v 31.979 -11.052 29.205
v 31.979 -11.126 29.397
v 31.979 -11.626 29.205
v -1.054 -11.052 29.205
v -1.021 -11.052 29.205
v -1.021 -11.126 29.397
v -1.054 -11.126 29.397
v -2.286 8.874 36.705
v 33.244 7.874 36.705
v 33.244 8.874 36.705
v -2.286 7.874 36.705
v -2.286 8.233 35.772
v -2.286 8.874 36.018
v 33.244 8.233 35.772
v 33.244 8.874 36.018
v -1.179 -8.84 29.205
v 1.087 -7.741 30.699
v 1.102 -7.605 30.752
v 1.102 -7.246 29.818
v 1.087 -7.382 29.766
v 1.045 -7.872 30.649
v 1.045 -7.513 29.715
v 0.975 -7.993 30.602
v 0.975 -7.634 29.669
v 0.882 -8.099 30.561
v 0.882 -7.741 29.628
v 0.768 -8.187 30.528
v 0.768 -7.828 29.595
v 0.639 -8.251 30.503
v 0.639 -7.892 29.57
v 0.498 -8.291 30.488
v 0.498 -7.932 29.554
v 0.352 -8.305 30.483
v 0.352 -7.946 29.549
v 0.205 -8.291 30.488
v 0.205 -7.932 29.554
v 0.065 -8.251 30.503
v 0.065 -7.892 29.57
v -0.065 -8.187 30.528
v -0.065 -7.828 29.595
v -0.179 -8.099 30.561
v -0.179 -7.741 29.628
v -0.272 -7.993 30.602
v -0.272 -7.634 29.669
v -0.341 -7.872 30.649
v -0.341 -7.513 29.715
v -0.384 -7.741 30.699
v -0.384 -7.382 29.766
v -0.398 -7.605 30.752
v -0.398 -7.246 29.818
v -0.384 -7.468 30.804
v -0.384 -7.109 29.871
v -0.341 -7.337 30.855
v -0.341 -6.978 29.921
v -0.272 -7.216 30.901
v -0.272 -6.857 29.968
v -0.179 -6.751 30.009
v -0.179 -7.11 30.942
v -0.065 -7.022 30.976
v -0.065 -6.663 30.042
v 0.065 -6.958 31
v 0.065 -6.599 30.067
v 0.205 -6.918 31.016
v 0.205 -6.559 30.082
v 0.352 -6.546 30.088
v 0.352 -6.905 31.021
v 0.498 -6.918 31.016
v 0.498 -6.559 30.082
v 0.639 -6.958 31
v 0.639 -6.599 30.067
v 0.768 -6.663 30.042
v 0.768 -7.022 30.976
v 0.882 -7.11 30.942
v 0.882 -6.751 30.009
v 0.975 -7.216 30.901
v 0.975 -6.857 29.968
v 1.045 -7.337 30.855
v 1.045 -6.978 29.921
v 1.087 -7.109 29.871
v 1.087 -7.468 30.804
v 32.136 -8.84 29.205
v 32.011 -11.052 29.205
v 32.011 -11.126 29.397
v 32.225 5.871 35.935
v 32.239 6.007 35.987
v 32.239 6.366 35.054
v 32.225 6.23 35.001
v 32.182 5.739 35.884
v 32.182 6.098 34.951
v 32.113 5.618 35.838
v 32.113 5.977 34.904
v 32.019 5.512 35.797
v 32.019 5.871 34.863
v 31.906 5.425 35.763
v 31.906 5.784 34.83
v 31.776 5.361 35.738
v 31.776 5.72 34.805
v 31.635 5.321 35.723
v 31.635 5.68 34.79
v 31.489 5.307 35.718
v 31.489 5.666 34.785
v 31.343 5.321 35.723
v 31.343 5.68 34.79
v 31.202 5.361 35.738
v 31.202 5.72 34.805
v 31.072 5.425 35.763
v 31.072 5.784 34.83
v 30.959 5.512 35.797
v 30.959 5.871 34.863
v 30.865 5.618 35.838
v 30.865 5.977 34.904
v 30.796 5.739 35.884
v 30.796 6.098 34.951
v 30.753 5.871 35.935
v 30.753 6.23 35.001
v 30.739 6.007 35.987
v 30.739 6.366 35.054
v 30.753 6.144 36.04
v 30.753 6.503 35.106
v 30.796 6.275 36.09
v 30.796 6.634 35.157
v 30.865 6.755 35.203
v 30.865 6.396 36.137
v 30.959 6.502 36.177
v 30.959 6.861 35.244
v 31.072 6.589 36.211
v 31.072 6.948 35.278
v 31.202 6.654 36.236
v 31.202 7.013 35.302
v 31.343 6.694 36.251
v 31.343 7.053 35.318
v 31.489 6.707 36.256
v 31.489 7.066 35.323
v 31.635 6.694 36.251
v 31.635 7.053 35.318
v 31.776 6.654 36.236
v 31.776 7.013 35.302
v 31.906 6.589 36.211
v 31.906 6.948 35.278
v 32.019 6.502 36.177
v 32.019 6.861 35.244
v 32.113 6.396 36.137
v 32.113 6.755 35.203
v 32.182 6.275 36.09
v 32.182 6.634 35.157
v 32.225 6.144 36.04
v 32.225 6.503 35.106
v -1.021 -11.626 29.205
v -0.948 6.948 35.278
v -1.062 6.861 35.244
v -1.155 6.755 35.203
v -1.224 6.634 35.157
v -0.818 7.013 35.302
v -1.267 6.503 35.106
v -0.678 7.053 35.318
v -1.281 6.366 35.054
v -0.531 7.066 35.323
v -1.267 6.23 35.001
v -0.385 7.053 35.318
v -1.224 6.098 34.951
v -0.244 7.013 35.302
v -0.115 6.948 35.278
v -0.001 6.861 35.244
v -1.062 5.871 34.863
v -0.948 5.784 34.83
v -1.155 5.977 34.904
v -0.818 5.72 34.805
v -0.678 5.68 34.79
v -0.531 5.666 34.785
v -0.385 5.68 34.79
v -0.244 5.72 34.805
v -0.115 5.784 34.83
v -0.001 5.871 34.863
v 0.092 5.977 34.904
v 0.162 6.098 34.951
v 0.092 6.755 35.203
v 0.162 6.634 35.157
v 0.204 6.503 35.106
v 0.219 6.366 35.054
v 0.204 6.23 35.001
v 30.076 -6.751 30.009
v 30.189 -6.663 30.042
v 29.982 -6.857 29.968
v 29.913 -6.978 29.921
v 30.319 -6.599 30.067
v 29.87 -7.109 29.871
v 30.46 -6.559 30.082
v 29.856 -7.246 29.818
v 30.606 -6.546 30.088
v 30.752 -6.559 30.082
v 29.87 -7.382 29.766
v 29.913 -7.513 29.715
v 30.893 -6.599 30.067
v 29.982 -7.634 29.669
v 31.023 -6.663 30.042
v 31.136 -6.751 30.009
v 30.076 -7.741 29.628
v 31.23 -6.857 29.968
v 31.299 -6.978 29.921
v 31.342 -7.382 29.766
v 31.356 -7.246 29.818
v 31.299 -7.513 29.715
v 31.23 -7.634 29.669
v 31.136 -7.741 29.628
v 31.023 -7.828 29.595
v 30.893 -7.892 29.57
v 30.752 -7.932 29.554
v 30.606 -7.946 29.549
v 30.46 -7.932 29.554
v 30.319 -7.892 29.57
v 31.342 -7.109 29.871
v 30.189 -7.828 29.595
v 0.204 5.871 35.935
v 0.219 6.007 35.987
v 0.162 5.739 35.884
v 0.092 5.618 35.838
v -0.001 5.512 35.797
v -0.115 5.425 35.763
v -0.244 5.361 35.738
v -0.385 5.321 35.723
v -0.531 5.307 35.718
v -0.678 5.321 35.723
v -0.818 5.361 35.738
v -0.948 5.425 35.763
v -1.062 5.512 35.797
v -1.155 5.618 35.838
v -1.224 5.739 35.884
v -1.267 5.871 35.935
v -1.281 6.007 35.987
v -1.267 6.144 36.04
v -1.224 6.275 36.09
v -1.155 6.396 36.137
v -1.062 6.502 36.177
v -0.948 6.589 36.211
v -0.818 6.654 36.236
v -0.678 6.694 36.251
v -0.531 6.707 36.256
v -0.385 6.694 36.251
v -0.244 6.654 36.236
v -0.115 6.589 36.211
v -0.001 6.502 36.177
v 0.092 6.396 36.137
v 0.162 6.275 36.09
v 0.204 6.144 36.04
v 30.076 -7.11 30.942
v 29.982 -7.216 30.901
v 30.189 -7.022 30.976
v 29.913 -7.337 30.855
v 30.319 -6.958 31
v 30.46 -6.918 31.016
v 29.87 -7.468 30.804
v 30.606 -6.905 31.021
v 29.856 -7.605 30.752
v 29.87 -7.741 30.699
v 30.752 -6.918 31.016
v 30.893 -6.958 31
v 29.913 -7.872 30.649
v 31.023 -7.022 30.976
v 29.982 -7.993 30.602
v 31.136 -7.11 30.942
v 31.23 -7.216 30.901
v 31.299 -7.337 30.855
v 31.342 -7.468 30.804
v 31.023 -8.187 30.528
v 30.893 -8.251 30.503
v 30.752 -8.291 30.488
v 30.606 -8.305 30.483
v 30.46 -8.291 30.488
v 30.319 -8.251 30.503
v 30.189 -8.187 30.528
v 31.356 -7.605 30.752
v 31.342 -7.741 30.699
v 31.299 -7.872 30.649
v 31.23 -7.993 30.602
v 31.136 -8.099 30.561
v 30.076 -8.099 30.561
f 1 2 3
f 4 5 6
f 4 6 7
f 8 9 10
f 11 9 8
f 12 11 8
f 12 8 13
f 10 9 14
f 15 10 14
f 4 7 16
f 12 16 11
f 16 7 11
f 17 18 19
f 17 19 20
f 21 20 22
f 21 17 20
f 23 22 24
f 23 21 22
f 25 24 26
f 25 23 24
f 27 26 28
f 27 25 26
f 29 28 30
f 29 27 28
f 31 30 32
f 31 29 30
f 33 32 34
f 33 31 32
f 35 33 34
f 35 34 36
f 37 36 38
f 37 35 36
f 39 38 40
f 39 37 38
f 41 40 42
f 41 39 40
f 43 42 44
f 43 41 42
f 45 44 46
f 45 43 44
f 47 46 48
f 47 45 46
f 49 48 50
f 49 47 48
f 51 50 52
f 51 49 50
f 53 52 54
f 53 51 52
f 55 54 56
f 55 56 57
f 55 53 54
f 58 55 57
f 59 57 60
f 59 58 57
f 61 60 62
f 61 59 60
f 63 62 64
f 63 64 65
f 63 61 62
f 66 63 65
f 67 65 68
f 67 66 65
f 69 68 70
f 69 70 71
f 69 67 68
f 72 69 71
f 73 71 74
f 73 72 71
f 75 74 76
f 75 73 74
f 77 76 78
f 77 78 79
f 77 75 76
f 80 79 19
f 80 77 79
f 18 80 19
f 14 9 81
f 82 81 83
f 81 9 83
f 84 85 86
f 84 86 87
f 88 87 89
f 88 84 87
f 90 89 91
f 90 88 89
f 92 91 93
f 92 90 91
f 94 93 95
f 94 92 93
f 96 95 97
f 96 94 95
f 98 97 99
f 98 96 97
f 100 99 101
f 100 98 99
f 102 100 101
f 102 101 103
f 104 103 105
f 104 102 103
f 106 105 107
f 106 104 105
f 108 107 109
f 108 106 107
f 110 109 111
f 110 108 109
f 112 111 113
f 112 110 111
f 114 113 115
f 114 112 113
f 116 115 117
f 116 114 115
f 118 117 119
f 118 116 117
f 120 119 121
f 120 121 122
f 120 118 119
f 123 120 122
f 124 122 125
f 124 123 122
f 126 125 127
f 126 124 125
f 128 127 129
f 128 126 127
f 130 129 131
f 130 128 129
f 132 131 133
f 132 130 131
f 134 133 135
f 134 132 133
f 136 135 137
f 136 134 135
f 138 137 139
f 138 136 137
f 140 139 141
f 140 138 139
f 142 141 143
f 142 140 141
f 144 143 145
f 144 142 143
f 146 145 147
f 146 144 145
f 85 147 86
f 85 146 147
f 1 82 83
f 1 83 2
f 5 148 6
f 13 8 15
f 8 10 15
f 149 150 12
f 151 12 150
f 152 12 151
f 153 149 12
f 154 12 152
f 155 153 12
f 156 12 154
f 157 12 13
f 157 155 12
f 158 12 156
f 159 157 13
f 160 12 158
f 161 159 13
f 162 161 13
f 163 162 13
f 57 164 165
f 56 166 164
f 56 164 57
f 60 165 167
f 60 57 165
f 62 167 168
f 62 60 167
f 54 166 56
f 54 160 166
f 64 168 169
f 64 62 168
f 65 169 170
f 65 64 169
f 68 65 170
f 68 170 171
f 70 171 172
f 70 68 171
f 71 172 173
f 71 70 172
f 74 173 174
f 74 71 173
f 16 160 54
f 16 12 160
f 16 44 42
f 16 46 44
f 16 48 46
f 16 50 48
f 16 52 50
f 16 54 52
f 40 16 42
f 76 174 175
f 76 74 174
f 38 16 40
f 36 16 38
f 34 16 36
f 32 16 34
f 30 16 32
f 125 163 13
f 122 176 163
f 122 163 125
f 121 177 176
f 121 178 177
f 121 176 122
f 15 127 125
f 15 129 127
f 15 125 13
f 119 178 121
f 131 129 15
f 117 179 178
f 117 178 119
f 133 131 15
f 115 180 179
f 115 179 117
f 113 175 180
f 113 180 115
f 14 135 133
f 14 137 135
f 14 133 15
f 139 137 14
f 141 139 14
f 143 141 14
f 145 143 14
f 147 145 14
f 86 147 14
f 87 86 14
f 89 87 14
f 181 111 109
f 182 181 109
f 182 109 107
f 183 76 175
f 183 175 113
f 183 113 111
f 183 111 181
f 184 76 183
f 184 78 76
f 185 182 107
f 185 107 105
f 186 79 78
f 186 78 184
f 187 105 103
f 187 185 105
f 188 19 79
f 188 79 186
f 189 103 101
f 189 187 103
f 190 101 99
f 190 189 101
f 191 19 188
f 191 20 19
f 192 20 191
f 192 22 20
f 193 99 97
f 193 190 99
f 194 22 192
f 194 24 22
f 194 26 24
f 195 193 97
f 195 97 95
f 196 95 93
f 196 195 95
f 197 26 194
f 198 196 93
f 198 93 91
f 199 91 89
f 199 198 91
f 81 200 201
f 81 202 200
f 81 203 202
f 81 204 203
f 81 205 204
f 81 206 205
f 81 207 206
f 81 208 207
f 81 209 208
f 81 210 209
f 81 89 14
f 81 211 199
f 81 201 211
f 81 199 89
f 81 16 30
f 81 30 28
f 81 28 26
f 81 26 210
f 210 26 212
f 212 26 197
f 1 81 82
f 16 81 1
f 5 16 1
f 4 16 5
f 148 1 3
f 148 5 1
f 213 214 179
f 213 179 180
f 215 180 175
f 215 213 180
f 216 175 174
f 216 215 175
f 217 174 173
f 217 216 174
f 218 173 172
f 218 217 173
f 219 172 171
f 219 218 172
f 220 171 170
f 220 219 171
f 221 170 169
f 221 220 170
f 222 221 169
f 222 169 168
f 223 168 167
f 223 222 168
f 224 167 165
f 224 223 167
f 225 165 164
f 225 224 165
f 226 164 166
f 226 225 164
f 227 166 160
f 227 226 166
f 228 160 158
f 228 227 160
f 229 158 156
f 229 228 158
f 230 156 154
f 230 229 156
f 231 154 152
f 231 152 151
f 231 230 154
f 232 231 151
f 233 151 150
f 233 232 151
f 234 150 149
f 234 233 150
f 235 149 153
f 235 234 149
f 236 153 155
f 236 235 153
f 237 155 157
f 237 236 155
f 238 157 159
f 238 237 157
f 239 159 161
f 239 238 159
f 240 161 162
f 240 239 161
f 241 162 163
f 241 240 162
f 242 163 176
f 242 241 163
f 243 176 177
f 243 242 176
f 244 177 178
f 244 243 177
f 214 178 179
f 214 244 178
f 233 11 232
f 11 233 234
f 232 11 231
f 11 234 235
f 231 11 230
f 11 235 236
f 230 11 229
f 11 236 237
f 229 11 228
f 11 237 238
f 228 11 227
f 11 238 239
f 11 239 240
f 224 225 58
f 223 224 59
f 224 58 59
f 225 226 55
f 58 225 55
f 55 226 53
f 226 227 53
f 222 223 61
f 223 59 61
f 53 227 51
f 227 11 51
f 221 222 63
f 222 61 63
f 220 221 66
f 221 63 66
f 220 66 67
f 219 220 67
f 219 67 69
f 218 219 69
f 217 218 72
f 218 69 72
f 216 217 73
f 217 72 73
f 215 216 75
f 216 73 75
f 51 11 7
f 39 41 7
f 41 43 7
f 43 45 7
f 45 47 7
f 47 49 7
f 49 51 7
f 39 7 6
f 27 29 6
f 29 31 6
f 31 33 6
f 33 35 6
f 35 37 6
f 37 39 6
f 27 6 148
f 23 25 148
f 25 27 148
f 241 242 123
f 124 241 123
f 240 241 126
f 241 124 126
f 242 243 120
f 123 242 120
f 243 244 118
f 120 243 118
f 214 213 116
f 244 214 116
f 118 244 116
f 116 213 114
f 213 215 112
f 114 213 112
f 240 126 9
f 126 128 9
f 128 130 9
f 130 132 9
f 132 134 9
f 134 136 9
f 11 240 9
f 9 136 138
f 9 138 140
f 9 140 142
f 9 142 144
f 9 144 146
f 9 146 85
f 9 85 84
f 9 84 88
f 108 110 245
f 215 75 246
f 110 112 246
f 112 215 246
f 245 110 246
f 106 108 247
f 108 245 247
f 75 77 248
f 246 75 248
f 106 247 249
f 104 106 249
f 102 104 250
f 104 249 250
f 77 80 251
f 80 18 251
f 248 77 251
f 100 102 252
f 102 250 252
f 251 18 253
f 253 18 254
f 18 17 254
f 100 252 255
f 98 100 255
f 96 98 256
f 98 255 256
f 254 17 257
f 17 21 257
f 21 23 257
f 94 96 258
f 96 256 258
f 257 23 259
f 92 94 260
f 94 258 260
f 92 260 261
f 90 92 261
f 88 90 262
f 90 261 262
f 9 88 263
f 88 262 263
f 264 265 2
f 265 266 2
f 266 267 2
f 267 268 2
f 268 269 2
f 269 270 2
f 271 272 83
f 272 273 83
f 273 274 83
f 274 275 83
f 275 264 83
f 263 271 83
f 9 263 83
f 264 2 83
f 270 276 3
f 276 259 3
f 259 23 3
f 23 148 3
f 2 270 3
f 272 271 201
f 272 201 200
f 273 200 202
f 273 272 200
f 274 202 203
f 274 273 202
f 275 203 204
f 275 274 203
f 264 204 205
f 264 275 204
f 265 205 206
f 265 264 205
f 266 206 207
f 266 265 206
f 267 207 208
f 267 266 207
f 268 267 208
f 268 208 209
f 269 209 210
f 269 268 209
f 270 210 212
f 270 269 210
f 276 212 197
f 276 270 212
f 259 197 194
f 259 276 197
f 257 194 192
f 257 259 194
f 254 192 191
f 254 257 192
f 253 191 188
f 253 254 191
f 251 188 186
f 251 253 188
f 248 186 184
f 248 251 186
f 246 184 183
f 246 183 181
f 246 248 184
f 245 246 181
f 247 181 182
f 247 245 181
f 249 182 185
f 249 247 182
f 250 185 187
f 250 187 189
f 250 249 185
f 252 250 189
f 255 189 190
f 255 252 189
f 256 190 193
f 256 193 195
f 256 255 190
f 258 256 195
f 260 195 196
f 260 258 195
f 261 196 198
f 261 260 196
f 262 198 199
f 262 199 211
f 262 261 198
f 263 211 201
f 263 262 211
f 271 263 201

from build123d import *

# Parameters (mm, degrees)
BOSS_EXTRUDE1_DEPTH     = 1
BOSS_EXTRUDE2_REACH     = 55.976
SKETCH4_W               = 35.529511627
SKETCH4_H               = 1
CUT_EXTRUDE3_DEPTH      = 54.861211874
CUT_EXTRUDE3_DEPTH_BACK = 54.861211874
CUT_EXTRUDE4_DEPTH      = 52.541211292
CUT_EXTRUDE4_DEPTH_BACK = 52.541211292
CAVITY1_START           = -31.431872012
CAVITY1_OUTLINE_R       = 0.75
CAVITY1_DEPTH           = 1


# Read off the part's stored shape, not the designer's step: Cavity1
with BuildPart() as part:
    # Sketch1 → Boss-Extrude1 (new body)
    with BuildSketch(Plane(origin=(0, -11.283384476, 29.336799637), x_dir=(-1, 0, 0), z_dir=(0, 0.35897907930886913, -0.9333456062030595))):
        Polygon((2.285907974, 20.525558465), (-33.243603653, 20.525558465), (-32.011277476, 0.168683291), (-31.978847839, 0.168683291), (-31.978847839, -0.36702395), (1.021152161, -0.36702395), (1.021152161, 0.168683291), (1.053581797, 0.168683291), align=None)
    extrude(amount=BOSS_EXTRUDE1_DEPTH)

    # Boss-Extrude2: up to this plane
    boss_extrude2_end = Plane(origin=(160.237455752, 8.874055334, 36.705045718), z_dir=(0, -1, 0))
    # Sketch4 → Boss-Extrude2 (add, up to the surface)
    with BuildSketch(Plane(origin=(0, 19.157439808, 7.36824608), x_dir=(1, 0, 0), z_dir=(0, 0.9333456062030596, 0.35897907930886913)), mode=Mode.PRIVATE) as boss_extrude2_sk1:
        with Locations((15.47884784, -30.931872012)):
            Rectangle(SKETCH4_W, SKETCH4_H)
    boss_extrude2_tool1 = split(extrude(boss_extrude2_sk1.sketch, amount=BOSS_EXTRUDE2_REACH, mode=Mode.PRIVATE), bisect_by=boss_extrude2_end, keep=Keep.BOTH, mode=Mode.PRIVATE)
    add(boss_extrude2_tool1.solids().sort_by_distance((15.478848, 8.053545, 36.238373))[0])

    # Sketch5 → Cut-Extrude3 (cut, two sides: drawn at the far end of the back side and taken through both)
    with BuildSketch(Plane(origin=(0, 8.874055334, 0), x_dir=(1, 0, 0), z_dir=(0, 1, 0)).offset(-CUT_EXTRUDE3_DEPTH_BACK)):
        Polygon((116.276952597, -36.705045717), (33.243603653, -36.705045717), (-2.285907974, -36.705045717), (-85.319256919, -36.705045717), (-85.319256919, -202.771743607), (116.276952597, -202.771743607), align=None)
    extrude(amount=CUT_EXTRUDE3_DEPTH + CUT_EXTRUDE3_DEPTH_BACK, mode=Mode.SUBTRACT)

    # Sketch6 → Cut-Extrude4 (cut, two sides: drawn at the far end of the back side and taken through both)
    with BuildSketch(Plane(origin=(31.978847839, 0, 0), x_dir=(0, 0, -1), z_dir=(1, 0, 0)).offset(-CUT_EXTRUDE4_DEPTH_BACK)):
        Polygon((-29.205045717, -65.283704575), (-29.205045717, -11.625944667), (-29.205045717, -5.8346384), (-29.205045717, 47.823121508), (78.110474099, 47.823121508), (78.110474099, -65.283704575), align=None)
    extrude(amount=CUT_EXTRUDE4_DEPTH + CUT_EXTRUDE4_DEPTH_BACK, mode=Mode.SUBTRACT)

    # Cavity1 outline → Cavity1 (cut)
    with BuildSketch(Plane(origin=(0, 0, 0), x_dir=(1, 0, 0), z_dir=(0, 0.3589790793088689, -0.9333456062030596)).offset(CAVITY1_START)):
        with Locations((-0.531246108, -18.525558467)):
            Circle(CAVITY1_OUTLINE_R)
        with Locations((0.351610097, -3.941600191)):
            Circle(CAVITY1_OUTLINE_R)
        with Locations((30.606085582, -3.941600191)):
            Circle(CAVITY1_OUTLINE_R)
        with Locations((31.488941787, -18.525558467)):
            Circle(CAVITY1_OUTLINE_R)
    extrude(amount=CAVITY1_DEPTH, mode=Mode.SUBTRACT)


solid = part.part
